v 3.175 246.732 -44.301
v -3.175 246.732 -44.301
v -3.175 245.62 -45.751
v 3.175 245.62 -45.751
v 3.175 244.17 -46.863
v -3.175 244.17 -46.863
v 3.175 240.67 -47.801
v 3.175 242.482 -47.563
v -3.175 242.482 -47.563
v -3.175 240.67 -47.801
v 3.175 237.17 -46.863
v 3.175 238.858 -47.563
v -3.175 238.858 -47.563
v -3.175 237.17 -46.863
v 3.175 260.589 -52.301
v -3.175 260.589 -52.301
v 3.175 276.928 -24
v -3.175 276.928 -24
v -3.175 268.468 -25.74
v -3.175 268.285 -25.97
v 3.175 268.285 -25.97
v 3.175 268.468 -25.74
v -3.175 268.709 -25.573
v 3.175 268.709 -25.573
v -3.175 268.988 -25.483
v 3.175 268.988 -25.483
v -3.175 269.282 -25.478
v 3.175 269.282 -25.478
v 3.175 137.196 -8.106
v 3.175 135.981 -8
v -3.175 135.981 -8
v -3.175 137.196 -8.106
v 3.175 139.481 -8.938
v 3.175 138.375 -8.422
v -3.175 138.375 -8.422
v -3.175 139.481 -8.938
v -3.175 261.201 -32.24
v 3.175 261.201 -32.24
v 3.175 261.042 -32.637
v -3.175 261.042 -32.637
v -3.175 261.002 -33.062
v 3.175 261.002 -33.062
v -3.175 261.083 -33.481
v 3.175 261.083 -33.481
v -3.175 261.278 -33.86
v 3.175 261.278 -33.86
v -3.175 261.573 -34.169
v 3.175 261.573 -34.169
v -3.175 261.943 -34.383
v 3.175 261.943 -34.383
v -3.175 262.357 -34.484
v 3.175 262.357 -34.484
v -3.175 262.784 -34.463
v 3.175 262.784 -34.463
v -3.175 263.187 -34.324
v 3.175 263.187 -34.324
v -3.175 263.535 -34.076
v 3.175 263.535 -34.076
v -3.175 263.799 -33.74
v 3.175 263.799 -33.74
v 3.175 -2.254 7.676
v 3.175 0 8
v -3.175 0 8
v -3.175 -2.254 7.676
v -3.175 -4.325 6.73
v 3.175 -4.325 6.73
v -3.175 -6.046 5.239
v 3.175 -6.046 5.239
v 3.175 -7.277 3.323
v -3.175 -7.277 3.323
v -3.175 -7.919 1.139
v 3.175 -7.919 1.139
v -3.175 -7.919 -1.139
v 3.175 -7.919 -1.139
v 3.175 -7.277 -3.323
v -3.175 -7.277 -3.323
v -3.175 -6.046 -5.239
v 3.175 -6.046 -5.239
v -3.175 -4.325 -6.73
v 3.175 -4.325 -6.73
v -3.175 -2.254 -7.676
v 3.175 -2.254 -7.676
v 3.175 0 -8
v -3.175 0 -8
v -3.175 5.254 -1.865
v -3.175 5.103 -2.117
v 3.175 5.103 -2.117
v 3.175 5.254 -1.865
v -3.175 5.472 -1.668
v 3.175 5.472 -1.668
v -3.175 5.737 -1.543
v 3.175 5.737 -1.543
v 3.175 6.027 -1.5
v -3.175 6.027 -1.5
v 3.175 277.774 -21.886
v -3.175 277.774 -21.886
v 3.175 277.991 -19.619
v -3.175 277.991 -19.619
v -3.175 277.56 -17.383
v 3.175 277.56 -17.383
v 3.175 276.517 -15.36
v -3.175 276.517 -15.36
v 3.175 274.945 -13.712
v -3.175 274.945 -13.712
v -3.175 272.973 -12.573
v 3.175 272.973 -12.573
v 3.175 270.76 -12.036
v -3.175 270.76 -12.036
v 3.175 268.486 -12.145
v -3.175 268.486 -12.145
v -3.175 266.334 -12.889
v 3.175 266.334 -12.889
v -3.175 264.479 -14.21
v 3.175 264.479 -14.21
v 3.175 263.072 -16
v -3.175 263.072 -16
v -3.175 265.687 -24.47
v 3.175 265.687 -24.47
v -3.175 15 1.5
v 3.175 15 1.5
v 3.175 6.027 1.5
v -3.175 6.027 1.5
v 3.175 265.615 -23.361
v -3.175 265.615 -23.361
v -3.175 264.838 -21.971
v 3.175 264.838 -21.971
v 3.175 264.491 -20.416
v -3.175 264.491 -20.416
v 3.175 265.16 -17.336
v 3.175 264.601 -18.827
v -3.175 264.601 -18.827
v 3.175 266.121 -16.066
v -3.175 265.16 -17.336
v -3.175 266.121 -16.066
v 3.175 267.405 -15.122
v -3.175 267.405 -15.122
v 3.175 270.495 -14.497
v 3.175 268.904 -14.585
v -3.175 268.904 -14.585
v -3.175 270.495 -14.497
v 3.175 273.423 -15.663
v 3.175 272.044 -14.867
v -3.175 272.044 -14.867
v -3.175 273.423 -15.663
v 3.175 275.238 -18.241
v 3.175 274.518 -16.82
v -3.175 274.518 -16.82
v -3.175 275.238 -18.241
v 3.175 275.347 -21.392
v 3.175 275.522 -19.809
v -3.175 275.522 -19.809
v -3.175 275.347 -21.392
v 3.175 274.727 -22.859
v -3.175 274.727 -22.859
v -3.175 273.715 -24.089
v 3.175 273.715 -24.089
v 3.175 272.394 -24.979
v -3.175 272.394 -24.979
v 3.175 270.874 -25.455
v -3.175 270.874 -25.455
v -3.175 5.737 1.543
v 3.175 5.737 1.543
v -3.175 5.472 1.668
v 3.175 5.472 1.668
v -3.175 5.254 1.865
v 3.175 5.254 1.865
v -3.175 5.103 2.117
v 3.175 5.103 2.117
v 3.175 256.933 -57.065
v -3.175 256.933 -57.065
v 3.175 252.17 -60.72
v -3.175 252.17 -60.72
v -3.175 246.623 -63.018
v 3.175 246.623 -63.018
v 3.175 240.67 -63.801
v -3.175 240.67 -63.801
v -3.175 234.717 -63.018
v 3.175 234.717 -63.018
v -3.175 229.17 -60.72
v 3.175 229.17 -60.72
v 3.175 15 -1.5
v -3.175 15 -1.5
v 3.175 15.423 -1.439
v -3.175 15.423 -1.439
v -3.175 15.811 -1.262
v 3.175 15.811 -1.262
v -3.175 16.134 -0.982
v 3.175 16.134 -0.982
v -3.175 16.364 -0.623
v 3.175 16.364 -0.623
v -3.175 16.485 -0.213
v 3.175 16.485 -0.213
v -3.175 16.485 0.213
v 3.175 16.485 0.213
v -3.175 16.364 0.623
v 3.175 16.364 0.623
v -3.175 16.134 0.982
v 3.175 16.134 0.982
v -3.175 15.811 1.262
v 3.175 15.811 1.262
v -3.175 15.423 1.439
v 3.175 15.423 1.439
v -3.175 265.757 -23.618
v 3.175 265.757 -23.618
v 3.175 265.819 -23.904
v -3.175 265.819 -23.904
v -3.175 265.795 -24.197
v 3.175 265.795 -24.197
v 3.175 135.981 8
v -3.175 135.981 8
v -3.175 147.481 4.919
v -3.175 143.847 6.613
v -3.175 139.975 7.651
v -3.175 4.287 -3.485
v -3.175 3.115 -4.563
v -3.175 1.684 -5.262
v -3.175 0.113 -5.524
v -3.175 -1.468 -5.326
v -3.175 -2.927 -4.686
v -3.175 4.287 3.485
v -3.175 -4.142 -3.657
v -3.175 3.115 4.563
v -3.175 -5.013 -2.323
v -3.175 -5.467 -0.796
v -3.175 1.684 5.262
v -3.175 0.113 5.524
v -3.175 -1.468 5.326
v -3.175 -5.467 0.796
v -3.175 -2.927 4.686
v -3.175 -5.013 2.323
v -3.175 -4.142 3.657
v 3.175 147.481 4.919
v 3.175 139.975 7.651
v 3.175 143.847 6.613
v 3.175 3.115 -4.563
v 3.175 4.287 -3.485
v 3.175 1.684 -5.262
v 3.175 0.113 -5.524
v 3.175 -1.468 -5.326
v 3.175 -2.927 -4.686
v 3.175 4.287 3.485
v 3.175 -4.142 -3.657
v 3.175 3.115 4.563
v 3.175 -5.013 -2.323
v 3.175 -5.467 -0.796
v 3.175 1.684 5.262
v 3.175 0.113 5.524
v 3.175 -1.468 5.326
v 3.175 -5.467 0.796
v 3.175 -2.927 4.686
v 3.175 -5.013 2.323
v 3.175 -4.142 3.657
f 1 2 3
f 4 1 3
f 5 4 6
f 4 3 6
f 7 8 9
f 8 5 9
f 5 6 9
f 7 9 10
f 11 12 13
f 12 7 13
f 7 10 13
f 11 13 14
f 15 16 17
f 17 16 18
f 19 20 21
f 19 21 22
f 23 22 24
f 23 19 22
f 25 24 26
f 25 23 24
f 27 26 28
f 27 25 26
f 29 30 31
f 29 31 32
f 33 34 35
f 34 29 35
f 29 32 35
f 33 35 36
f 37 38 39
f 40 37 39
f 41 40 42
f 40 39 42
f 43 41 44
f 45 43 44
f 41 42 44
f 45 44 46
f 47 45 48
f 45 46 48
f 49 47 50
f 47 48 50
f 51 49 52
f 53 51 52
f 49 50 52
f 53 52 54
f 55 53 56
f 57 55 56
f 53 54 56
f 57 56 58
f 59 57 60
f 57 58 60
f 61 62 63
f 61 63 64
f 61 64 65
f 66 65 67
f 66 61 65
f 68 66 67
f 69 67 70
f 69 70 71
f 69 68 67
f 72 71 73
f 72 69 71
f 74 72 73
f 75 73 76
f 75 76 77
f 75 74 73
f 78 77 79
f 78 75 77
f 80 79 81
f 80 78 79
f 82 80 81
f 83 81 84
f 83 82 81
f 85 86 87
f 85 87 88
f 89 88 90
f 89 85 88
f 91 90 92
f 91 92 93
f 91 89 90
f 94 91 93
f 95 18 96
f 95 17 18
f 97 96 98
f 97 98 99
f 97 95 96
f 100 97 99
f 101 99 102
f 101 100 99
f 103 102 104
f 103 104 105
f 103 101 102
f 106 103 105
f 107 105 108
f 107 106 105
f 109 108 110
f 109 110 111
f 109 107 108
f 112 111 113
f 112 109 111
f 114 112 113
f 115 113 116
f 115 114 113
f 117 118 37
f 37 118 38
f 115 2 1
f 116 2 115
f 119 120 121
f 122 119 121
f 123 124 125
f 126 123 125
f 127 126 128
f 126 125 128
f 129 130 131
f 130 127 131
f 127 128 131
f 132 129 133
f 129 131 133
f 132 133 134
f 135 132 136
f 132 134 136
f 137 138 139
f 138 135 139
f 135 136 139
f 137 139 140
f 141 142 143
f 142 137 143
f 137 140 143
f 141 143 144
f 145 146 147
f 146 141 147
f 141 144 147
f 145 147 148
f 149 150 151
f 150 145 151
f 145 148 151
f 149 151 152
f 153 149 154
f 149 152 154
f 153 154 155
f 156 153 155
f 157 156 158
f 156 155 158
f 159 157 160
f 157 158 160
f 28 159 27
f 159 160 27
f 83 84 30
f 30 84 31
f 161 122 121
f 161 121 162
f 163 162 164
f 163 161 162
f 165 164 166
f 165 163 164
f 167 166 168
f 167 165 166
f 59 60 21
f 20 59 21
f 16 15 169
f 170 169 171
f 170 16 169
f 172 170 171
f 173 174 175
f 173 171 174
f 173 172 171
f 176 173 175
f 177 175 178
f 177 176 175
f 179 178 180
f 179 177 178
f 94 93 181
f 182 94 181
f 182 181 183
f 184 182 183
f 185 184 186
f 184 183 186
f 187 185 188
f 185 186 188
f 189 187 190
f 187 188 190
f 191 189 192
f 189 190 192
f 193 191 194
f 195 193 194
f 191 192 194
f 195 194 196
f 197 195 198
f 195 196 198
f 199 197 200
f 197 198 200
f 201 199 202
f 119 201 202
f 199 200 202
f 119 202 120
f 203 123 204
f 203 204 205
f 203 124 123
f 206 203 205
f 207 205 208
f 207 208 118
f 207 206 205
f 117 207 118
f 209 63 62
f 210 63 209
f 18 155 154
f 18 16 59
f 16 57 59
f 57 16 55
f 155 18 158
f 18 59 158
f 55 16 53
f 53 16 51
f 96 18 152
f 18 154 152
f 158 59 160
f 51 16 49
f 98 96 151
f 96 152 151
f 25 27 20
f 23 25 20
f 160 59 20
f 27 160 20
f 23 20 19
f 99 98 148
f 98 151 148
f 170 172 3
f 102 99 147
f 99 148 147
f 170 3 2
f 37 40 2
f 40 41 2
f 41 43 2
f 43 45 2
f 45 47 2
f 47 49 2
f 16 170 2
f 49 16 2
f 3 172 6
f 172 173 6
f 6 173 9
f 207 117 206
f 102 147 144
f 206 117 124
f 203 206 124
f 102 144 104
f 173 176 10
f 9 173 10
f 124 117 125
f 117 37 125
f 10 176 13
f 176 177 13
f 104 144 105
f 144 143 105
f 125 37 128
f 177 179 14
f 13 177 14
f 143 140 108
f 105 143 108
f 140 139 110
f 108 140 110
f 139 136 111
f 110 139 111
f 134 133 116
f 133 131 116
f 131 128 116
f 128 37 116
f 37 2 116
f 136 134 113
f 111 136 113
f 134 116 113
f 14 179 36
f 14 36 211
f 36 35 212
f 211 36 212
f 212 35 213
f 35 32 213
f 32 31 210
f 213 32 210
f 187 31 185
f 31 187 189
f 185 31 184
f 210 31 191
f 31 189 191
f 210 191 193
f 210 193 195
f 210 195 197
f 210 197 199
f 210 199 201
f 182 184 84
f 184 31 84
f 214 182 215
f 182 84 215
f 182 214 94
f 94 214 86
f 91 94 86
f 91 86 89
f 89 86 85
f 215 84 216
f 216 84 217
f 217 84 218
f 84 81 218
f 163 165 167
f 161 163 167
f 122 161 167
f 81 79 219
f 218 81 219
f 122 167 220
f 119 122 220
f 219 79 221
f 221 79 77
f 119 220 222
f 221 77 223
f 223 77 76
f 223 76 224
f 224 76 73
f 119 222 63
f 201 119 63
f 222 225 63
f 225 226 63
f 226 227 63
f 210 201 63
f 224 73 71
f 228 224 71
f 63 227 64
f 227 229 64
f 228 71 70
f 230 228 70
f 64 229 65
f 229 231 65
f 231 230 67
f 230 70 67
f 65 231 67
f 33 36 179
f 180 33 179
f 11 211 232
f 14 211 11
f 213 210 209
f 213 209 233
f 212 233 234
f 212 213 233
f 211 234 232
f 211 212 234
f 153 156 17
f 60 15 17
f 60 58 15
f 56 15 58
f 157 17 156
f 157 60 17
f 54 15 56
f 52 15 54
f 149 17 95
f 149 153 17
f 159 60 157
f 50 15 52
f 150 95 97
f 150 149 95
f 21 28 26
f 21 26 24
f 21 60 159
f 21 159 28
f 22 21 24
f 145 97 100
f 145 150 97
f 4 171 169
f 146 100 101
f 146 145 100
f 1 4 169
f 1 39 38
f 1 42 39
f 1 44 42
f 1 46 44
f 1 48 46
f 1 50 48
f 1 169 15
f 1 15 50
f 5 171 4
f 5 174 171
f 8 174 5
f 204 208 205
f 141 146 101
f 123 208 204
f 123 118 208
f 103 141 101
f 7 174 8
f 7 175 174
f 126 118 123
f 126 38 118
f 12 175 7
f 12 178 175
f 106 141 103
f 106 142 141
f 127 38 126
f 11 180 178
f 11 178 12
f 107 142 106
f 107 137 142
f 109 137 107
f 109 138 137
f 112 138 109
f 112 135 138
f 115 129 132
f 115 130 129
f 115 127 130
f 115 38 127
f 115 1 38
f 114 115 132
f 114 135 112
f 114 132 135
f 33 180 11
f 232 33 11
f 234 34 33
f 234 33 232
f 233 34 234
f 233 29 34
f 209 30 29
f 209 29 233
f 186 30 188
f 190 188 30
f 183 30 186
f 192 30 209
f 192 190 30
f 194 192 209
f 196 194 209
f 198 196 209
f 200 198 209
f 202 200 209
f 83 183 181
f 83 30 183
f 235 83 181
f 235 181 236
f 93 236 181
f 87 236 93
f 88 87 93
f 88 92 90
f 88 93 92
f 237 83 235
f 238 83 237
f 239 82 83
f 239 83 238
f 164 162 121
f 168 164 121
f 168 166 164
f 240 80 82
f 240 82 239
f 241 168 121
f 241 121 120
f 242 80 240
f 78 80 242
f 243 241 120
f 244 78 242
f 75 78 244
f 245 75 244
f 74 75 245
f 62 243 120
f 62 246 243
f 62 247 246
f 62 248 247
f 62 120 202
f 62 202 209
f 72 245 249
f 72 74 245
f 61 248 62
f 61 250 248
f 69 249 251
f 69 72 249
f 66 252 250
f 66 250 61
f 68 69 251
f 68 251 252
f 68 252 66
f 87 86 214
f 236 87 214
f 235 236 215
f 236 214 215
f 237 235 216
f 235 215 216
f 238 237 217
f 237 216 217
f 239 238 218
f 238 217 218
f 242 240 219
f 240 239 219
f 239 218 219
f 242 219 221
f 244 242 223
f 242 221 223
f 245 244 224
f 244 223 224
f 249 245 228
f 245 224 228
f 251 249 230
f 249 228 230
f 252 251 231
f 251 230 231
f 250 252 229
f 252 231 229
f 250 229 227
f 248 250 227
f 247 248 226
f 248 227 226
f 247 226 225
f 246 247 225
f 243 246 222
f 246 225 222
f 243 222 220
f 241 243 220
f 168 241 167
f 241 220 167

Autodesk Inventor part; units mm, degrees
ref_plane "YZ Plane" through (0, 0, 0) normal (1, 0, 0) x (0, 1, 0)
ref_plane "XZ Plane" through (0, 0, 0) normal (0, 1, 0) x (-1, 0, 0)
ref_plane "XY Plane" through (0, 0, 0) normal (0, 0, 1) x (1, 0, 0)
sketch "Sketch1" plane through (0, 0, 0) normal (1, 0, 0) x (0, 1, 0)
  line L0 (-10, -10) -> (10, -10) construction
  line L1 (10, -10) -> (10, 10) construction
  line L2 (10, 10) -> (-10, 10) construction
  line L3 (-10, 10) -> (-10, -10) construction
  line L4 (-10, -10) -> (10, 10) construction
  line L5 (10, -10) -> (-10, 10) construction
  line L6 (0, 0) -> (135.9808, 0)
  line L7 (253.6603, -48.3013) -> (270, -20)
  line L8 (114.9075, -11.5) -> (119.815, -20) construction
  line L9 (119.815, -20) -> (114.9075, -28.5) construction
  line L10 (114.9075, -28.5) -> (105.0925, -28.5) construction
  line L11 (105.0925, -28.5) -> (100.185, -20) construction
  line L12 (100.185, -20) -> (105.0925, -11.5) construction
  line L13 (105.0925, -11.5) -> (114.9075, -11.5) construction
  line L14 (143.4808, -2.0096) -> (233.1699, -53.7917)
  arc A0 (233.1699, -53.7917) -> (253.6603, -48.3013) centre (240.6699, -40.8013) ccw
  arc A1 (143.4808, -2.0096) -> (135.9808, 0) centre (135.9808, -15) ccw
  point P0 (140, 0)
  point P1 (246.1603, -61.2917)
  point P2 (110, -20)
  dimension "d0" = 270
  dimension "d4" = 20
  dimension "d5" = 20
  dimension "d60" = 20
  dimension "d65" = 17
  dimension "d66" = 160
  dimension "d68" = 11.5
  dimension "d82" = 150
  dimension "d83" = 140
  dimension "d84" = 15
  dimension "d93" = 15
surface extrude "ExtrusionSrf1" sketch "Sketch1" along normal mid plane 6.35 shown no curves L6 A1 L14 A0 L7
thicken "Thicken1" operation new thickness 16 both sides yes extend neighbours no toward (0, 0, 1) faces at (-1.0583, 45.3269, 0) (1.0583, 139.44, -0.4043) (1.0583, 173.3771, -19.2703) (1.0583, 244.0077, -55.4252) (-1.0583, 259.1068, -38.8675)
sketch "Sketch4" plane through (3.175, 0, 8) normal (1, 0, 0) x (0, 0, -1)
  line L0 (60.3013, 260.5885) -> (32, 276.9282) projected
  line L1 (32, 276.9282) -> (24, 263.0718) projected
  line L2 (52.3013, 246.7321) -> (24, 263.0718) projected
  arc A0 (54.8634, 237.1699) -> (52.3013, 246.7321) centre (48.8013, 240.6699) ccw projected
  line L3 (3.0814, 147.4808) -> (54.8634, 237.1699) projected
  line L4 (0, 0) -> (0, 135.9808) projected
  line L5 (16, 0) -> (0, 0) projected
  line L6 (16, 0) -> (16, 135.9808) projected
  line L7 (16.9378, 139.4808) -> (68.7199, 229.1699) projected
  arc A1 (68.7199, 229.1699) -> (60.3013, 260.5885) centre (48.8013, 240.6699) ccw projected
  line L8 (16, 0) -> (0, 0) projected
  circle A2 centre (8, 0) radius 8
  circle A3 centre (28, 270) radius 8
  arc A4 (3.0814, 147.4808) -> (0, 135.9808) centre (23, 135.9808) ccw projected
  arc A5 (16.9378, 139.4808) -> (16, 135.9808) centre (23, 135.9808) ccw projected
extrude "Extrusion2" add sketch "Sketch4" against normal up to surface (6.35 mm away) contours L1 A3 | A2 L5 | L5 A2 picked at (25.5467, 271.0452)
hole "Hole4" at (3.175, 0, 0) at (3.175, 270, -20) direction (-1, 0, 0) diameter 11.05 end through all
sketch "Sketch5" plane through (3.175, 0, 0) normal (1, 0, 0) x (0, 0, -1)
  line L0 (-8, 0) -> (-8, 135.9808) projected
  arc A0 (-8, 0) -> (8, 0) centre (0, 0) ccw projected
  line L1 (8, 0) -> (8, 135.9808) projected
  line L2 (8.9378, 139.4808) -> (60.7199, 229.1699) projected
  arc A1 (60.7199, 229.1699) -> (52.3013, 260.5885) centre (40.8013, 240.6699) ccw projected
  line L3 (52.3013, 260.5885) -> (24, 276.9282) projected
  arc A2 (24, 276.9282) -> (16, 263.0718) centre (20, 270) ccw projected
  line L4 (44.3013, 246.7321) -> (16, 263.0718) projected
  arc A3 (46.8634, 237.1699) -> (44.3013, 246.7321) centre (40.8013, 240.6699) ccw projected
  line L5 (-4.9186, 147.4808) -> (46.8634, 237.1699) projected
  circle A4 centre (0, 0) radius 5.525 projected
  circle A5 centre (20, 270) radius 5.525 projected
  line L6 (20, 270) -> (32.9904, 262.5) construction
  line L7 (19.25, 268.701) -> (32.2404, 261.201)
  line L8 (33.7404, 263.799) -> (20.75, 271.299)
  arc A6 (20.75, 271.299) -> (19.25, 268.701) centre (20, 270) ccw
  arc A7 (32.2404, 261.201) -> (33.7404, 263.799) centre (32.9904, 262.5) ccw
  line L9 (0, 0) -> (0, 15) construction
  line L10 (1.5, 0) -> (1.5, 15)
  line L11 (-1.5, 15) -> (-1.5, 0)
  arc A8 (-1.5, 0) -> (1.5, 0) centre (0, 0) ccw
  arc A9 (1.5, 15) -> (-1.5, 15) centre (0, 15) ccw
  arc A10 (8.9378, 139.4808) -> (8, 135.9808) centre (15, 135.9808) ccw projected
  arc A11 (-4.9186, 147.4808) -> (-8, 135.9808) centre (15, 135.9808) ccw projected
  point P0 (0, 0)
  point P1 (26.4952, 266.25)
  point P2 (0, 7.5)
  point P3 (-1.5, 5.3175)
  point P4 (1.5, 5.3175)
  point P5 (25.3551, 268.6403)
  point P6 (23.8551, 266.0422)
  dimension "d86" = 3
  dimension "d87" = 15
extrude "Extrusion3" cut sketch "Sketch5" against normal through all contours A4 L11 A9 L10 | A5 L8 A7 L7
fillet "Fillet4" radius 1 4 edges at (0, 266.0422, -23.8551) (0, 268.6403, -25.3551) (0, 5.3175, 1.5) (0, 5.3175, -1.5)
properties part number "Door Upper Parallel Bar"
